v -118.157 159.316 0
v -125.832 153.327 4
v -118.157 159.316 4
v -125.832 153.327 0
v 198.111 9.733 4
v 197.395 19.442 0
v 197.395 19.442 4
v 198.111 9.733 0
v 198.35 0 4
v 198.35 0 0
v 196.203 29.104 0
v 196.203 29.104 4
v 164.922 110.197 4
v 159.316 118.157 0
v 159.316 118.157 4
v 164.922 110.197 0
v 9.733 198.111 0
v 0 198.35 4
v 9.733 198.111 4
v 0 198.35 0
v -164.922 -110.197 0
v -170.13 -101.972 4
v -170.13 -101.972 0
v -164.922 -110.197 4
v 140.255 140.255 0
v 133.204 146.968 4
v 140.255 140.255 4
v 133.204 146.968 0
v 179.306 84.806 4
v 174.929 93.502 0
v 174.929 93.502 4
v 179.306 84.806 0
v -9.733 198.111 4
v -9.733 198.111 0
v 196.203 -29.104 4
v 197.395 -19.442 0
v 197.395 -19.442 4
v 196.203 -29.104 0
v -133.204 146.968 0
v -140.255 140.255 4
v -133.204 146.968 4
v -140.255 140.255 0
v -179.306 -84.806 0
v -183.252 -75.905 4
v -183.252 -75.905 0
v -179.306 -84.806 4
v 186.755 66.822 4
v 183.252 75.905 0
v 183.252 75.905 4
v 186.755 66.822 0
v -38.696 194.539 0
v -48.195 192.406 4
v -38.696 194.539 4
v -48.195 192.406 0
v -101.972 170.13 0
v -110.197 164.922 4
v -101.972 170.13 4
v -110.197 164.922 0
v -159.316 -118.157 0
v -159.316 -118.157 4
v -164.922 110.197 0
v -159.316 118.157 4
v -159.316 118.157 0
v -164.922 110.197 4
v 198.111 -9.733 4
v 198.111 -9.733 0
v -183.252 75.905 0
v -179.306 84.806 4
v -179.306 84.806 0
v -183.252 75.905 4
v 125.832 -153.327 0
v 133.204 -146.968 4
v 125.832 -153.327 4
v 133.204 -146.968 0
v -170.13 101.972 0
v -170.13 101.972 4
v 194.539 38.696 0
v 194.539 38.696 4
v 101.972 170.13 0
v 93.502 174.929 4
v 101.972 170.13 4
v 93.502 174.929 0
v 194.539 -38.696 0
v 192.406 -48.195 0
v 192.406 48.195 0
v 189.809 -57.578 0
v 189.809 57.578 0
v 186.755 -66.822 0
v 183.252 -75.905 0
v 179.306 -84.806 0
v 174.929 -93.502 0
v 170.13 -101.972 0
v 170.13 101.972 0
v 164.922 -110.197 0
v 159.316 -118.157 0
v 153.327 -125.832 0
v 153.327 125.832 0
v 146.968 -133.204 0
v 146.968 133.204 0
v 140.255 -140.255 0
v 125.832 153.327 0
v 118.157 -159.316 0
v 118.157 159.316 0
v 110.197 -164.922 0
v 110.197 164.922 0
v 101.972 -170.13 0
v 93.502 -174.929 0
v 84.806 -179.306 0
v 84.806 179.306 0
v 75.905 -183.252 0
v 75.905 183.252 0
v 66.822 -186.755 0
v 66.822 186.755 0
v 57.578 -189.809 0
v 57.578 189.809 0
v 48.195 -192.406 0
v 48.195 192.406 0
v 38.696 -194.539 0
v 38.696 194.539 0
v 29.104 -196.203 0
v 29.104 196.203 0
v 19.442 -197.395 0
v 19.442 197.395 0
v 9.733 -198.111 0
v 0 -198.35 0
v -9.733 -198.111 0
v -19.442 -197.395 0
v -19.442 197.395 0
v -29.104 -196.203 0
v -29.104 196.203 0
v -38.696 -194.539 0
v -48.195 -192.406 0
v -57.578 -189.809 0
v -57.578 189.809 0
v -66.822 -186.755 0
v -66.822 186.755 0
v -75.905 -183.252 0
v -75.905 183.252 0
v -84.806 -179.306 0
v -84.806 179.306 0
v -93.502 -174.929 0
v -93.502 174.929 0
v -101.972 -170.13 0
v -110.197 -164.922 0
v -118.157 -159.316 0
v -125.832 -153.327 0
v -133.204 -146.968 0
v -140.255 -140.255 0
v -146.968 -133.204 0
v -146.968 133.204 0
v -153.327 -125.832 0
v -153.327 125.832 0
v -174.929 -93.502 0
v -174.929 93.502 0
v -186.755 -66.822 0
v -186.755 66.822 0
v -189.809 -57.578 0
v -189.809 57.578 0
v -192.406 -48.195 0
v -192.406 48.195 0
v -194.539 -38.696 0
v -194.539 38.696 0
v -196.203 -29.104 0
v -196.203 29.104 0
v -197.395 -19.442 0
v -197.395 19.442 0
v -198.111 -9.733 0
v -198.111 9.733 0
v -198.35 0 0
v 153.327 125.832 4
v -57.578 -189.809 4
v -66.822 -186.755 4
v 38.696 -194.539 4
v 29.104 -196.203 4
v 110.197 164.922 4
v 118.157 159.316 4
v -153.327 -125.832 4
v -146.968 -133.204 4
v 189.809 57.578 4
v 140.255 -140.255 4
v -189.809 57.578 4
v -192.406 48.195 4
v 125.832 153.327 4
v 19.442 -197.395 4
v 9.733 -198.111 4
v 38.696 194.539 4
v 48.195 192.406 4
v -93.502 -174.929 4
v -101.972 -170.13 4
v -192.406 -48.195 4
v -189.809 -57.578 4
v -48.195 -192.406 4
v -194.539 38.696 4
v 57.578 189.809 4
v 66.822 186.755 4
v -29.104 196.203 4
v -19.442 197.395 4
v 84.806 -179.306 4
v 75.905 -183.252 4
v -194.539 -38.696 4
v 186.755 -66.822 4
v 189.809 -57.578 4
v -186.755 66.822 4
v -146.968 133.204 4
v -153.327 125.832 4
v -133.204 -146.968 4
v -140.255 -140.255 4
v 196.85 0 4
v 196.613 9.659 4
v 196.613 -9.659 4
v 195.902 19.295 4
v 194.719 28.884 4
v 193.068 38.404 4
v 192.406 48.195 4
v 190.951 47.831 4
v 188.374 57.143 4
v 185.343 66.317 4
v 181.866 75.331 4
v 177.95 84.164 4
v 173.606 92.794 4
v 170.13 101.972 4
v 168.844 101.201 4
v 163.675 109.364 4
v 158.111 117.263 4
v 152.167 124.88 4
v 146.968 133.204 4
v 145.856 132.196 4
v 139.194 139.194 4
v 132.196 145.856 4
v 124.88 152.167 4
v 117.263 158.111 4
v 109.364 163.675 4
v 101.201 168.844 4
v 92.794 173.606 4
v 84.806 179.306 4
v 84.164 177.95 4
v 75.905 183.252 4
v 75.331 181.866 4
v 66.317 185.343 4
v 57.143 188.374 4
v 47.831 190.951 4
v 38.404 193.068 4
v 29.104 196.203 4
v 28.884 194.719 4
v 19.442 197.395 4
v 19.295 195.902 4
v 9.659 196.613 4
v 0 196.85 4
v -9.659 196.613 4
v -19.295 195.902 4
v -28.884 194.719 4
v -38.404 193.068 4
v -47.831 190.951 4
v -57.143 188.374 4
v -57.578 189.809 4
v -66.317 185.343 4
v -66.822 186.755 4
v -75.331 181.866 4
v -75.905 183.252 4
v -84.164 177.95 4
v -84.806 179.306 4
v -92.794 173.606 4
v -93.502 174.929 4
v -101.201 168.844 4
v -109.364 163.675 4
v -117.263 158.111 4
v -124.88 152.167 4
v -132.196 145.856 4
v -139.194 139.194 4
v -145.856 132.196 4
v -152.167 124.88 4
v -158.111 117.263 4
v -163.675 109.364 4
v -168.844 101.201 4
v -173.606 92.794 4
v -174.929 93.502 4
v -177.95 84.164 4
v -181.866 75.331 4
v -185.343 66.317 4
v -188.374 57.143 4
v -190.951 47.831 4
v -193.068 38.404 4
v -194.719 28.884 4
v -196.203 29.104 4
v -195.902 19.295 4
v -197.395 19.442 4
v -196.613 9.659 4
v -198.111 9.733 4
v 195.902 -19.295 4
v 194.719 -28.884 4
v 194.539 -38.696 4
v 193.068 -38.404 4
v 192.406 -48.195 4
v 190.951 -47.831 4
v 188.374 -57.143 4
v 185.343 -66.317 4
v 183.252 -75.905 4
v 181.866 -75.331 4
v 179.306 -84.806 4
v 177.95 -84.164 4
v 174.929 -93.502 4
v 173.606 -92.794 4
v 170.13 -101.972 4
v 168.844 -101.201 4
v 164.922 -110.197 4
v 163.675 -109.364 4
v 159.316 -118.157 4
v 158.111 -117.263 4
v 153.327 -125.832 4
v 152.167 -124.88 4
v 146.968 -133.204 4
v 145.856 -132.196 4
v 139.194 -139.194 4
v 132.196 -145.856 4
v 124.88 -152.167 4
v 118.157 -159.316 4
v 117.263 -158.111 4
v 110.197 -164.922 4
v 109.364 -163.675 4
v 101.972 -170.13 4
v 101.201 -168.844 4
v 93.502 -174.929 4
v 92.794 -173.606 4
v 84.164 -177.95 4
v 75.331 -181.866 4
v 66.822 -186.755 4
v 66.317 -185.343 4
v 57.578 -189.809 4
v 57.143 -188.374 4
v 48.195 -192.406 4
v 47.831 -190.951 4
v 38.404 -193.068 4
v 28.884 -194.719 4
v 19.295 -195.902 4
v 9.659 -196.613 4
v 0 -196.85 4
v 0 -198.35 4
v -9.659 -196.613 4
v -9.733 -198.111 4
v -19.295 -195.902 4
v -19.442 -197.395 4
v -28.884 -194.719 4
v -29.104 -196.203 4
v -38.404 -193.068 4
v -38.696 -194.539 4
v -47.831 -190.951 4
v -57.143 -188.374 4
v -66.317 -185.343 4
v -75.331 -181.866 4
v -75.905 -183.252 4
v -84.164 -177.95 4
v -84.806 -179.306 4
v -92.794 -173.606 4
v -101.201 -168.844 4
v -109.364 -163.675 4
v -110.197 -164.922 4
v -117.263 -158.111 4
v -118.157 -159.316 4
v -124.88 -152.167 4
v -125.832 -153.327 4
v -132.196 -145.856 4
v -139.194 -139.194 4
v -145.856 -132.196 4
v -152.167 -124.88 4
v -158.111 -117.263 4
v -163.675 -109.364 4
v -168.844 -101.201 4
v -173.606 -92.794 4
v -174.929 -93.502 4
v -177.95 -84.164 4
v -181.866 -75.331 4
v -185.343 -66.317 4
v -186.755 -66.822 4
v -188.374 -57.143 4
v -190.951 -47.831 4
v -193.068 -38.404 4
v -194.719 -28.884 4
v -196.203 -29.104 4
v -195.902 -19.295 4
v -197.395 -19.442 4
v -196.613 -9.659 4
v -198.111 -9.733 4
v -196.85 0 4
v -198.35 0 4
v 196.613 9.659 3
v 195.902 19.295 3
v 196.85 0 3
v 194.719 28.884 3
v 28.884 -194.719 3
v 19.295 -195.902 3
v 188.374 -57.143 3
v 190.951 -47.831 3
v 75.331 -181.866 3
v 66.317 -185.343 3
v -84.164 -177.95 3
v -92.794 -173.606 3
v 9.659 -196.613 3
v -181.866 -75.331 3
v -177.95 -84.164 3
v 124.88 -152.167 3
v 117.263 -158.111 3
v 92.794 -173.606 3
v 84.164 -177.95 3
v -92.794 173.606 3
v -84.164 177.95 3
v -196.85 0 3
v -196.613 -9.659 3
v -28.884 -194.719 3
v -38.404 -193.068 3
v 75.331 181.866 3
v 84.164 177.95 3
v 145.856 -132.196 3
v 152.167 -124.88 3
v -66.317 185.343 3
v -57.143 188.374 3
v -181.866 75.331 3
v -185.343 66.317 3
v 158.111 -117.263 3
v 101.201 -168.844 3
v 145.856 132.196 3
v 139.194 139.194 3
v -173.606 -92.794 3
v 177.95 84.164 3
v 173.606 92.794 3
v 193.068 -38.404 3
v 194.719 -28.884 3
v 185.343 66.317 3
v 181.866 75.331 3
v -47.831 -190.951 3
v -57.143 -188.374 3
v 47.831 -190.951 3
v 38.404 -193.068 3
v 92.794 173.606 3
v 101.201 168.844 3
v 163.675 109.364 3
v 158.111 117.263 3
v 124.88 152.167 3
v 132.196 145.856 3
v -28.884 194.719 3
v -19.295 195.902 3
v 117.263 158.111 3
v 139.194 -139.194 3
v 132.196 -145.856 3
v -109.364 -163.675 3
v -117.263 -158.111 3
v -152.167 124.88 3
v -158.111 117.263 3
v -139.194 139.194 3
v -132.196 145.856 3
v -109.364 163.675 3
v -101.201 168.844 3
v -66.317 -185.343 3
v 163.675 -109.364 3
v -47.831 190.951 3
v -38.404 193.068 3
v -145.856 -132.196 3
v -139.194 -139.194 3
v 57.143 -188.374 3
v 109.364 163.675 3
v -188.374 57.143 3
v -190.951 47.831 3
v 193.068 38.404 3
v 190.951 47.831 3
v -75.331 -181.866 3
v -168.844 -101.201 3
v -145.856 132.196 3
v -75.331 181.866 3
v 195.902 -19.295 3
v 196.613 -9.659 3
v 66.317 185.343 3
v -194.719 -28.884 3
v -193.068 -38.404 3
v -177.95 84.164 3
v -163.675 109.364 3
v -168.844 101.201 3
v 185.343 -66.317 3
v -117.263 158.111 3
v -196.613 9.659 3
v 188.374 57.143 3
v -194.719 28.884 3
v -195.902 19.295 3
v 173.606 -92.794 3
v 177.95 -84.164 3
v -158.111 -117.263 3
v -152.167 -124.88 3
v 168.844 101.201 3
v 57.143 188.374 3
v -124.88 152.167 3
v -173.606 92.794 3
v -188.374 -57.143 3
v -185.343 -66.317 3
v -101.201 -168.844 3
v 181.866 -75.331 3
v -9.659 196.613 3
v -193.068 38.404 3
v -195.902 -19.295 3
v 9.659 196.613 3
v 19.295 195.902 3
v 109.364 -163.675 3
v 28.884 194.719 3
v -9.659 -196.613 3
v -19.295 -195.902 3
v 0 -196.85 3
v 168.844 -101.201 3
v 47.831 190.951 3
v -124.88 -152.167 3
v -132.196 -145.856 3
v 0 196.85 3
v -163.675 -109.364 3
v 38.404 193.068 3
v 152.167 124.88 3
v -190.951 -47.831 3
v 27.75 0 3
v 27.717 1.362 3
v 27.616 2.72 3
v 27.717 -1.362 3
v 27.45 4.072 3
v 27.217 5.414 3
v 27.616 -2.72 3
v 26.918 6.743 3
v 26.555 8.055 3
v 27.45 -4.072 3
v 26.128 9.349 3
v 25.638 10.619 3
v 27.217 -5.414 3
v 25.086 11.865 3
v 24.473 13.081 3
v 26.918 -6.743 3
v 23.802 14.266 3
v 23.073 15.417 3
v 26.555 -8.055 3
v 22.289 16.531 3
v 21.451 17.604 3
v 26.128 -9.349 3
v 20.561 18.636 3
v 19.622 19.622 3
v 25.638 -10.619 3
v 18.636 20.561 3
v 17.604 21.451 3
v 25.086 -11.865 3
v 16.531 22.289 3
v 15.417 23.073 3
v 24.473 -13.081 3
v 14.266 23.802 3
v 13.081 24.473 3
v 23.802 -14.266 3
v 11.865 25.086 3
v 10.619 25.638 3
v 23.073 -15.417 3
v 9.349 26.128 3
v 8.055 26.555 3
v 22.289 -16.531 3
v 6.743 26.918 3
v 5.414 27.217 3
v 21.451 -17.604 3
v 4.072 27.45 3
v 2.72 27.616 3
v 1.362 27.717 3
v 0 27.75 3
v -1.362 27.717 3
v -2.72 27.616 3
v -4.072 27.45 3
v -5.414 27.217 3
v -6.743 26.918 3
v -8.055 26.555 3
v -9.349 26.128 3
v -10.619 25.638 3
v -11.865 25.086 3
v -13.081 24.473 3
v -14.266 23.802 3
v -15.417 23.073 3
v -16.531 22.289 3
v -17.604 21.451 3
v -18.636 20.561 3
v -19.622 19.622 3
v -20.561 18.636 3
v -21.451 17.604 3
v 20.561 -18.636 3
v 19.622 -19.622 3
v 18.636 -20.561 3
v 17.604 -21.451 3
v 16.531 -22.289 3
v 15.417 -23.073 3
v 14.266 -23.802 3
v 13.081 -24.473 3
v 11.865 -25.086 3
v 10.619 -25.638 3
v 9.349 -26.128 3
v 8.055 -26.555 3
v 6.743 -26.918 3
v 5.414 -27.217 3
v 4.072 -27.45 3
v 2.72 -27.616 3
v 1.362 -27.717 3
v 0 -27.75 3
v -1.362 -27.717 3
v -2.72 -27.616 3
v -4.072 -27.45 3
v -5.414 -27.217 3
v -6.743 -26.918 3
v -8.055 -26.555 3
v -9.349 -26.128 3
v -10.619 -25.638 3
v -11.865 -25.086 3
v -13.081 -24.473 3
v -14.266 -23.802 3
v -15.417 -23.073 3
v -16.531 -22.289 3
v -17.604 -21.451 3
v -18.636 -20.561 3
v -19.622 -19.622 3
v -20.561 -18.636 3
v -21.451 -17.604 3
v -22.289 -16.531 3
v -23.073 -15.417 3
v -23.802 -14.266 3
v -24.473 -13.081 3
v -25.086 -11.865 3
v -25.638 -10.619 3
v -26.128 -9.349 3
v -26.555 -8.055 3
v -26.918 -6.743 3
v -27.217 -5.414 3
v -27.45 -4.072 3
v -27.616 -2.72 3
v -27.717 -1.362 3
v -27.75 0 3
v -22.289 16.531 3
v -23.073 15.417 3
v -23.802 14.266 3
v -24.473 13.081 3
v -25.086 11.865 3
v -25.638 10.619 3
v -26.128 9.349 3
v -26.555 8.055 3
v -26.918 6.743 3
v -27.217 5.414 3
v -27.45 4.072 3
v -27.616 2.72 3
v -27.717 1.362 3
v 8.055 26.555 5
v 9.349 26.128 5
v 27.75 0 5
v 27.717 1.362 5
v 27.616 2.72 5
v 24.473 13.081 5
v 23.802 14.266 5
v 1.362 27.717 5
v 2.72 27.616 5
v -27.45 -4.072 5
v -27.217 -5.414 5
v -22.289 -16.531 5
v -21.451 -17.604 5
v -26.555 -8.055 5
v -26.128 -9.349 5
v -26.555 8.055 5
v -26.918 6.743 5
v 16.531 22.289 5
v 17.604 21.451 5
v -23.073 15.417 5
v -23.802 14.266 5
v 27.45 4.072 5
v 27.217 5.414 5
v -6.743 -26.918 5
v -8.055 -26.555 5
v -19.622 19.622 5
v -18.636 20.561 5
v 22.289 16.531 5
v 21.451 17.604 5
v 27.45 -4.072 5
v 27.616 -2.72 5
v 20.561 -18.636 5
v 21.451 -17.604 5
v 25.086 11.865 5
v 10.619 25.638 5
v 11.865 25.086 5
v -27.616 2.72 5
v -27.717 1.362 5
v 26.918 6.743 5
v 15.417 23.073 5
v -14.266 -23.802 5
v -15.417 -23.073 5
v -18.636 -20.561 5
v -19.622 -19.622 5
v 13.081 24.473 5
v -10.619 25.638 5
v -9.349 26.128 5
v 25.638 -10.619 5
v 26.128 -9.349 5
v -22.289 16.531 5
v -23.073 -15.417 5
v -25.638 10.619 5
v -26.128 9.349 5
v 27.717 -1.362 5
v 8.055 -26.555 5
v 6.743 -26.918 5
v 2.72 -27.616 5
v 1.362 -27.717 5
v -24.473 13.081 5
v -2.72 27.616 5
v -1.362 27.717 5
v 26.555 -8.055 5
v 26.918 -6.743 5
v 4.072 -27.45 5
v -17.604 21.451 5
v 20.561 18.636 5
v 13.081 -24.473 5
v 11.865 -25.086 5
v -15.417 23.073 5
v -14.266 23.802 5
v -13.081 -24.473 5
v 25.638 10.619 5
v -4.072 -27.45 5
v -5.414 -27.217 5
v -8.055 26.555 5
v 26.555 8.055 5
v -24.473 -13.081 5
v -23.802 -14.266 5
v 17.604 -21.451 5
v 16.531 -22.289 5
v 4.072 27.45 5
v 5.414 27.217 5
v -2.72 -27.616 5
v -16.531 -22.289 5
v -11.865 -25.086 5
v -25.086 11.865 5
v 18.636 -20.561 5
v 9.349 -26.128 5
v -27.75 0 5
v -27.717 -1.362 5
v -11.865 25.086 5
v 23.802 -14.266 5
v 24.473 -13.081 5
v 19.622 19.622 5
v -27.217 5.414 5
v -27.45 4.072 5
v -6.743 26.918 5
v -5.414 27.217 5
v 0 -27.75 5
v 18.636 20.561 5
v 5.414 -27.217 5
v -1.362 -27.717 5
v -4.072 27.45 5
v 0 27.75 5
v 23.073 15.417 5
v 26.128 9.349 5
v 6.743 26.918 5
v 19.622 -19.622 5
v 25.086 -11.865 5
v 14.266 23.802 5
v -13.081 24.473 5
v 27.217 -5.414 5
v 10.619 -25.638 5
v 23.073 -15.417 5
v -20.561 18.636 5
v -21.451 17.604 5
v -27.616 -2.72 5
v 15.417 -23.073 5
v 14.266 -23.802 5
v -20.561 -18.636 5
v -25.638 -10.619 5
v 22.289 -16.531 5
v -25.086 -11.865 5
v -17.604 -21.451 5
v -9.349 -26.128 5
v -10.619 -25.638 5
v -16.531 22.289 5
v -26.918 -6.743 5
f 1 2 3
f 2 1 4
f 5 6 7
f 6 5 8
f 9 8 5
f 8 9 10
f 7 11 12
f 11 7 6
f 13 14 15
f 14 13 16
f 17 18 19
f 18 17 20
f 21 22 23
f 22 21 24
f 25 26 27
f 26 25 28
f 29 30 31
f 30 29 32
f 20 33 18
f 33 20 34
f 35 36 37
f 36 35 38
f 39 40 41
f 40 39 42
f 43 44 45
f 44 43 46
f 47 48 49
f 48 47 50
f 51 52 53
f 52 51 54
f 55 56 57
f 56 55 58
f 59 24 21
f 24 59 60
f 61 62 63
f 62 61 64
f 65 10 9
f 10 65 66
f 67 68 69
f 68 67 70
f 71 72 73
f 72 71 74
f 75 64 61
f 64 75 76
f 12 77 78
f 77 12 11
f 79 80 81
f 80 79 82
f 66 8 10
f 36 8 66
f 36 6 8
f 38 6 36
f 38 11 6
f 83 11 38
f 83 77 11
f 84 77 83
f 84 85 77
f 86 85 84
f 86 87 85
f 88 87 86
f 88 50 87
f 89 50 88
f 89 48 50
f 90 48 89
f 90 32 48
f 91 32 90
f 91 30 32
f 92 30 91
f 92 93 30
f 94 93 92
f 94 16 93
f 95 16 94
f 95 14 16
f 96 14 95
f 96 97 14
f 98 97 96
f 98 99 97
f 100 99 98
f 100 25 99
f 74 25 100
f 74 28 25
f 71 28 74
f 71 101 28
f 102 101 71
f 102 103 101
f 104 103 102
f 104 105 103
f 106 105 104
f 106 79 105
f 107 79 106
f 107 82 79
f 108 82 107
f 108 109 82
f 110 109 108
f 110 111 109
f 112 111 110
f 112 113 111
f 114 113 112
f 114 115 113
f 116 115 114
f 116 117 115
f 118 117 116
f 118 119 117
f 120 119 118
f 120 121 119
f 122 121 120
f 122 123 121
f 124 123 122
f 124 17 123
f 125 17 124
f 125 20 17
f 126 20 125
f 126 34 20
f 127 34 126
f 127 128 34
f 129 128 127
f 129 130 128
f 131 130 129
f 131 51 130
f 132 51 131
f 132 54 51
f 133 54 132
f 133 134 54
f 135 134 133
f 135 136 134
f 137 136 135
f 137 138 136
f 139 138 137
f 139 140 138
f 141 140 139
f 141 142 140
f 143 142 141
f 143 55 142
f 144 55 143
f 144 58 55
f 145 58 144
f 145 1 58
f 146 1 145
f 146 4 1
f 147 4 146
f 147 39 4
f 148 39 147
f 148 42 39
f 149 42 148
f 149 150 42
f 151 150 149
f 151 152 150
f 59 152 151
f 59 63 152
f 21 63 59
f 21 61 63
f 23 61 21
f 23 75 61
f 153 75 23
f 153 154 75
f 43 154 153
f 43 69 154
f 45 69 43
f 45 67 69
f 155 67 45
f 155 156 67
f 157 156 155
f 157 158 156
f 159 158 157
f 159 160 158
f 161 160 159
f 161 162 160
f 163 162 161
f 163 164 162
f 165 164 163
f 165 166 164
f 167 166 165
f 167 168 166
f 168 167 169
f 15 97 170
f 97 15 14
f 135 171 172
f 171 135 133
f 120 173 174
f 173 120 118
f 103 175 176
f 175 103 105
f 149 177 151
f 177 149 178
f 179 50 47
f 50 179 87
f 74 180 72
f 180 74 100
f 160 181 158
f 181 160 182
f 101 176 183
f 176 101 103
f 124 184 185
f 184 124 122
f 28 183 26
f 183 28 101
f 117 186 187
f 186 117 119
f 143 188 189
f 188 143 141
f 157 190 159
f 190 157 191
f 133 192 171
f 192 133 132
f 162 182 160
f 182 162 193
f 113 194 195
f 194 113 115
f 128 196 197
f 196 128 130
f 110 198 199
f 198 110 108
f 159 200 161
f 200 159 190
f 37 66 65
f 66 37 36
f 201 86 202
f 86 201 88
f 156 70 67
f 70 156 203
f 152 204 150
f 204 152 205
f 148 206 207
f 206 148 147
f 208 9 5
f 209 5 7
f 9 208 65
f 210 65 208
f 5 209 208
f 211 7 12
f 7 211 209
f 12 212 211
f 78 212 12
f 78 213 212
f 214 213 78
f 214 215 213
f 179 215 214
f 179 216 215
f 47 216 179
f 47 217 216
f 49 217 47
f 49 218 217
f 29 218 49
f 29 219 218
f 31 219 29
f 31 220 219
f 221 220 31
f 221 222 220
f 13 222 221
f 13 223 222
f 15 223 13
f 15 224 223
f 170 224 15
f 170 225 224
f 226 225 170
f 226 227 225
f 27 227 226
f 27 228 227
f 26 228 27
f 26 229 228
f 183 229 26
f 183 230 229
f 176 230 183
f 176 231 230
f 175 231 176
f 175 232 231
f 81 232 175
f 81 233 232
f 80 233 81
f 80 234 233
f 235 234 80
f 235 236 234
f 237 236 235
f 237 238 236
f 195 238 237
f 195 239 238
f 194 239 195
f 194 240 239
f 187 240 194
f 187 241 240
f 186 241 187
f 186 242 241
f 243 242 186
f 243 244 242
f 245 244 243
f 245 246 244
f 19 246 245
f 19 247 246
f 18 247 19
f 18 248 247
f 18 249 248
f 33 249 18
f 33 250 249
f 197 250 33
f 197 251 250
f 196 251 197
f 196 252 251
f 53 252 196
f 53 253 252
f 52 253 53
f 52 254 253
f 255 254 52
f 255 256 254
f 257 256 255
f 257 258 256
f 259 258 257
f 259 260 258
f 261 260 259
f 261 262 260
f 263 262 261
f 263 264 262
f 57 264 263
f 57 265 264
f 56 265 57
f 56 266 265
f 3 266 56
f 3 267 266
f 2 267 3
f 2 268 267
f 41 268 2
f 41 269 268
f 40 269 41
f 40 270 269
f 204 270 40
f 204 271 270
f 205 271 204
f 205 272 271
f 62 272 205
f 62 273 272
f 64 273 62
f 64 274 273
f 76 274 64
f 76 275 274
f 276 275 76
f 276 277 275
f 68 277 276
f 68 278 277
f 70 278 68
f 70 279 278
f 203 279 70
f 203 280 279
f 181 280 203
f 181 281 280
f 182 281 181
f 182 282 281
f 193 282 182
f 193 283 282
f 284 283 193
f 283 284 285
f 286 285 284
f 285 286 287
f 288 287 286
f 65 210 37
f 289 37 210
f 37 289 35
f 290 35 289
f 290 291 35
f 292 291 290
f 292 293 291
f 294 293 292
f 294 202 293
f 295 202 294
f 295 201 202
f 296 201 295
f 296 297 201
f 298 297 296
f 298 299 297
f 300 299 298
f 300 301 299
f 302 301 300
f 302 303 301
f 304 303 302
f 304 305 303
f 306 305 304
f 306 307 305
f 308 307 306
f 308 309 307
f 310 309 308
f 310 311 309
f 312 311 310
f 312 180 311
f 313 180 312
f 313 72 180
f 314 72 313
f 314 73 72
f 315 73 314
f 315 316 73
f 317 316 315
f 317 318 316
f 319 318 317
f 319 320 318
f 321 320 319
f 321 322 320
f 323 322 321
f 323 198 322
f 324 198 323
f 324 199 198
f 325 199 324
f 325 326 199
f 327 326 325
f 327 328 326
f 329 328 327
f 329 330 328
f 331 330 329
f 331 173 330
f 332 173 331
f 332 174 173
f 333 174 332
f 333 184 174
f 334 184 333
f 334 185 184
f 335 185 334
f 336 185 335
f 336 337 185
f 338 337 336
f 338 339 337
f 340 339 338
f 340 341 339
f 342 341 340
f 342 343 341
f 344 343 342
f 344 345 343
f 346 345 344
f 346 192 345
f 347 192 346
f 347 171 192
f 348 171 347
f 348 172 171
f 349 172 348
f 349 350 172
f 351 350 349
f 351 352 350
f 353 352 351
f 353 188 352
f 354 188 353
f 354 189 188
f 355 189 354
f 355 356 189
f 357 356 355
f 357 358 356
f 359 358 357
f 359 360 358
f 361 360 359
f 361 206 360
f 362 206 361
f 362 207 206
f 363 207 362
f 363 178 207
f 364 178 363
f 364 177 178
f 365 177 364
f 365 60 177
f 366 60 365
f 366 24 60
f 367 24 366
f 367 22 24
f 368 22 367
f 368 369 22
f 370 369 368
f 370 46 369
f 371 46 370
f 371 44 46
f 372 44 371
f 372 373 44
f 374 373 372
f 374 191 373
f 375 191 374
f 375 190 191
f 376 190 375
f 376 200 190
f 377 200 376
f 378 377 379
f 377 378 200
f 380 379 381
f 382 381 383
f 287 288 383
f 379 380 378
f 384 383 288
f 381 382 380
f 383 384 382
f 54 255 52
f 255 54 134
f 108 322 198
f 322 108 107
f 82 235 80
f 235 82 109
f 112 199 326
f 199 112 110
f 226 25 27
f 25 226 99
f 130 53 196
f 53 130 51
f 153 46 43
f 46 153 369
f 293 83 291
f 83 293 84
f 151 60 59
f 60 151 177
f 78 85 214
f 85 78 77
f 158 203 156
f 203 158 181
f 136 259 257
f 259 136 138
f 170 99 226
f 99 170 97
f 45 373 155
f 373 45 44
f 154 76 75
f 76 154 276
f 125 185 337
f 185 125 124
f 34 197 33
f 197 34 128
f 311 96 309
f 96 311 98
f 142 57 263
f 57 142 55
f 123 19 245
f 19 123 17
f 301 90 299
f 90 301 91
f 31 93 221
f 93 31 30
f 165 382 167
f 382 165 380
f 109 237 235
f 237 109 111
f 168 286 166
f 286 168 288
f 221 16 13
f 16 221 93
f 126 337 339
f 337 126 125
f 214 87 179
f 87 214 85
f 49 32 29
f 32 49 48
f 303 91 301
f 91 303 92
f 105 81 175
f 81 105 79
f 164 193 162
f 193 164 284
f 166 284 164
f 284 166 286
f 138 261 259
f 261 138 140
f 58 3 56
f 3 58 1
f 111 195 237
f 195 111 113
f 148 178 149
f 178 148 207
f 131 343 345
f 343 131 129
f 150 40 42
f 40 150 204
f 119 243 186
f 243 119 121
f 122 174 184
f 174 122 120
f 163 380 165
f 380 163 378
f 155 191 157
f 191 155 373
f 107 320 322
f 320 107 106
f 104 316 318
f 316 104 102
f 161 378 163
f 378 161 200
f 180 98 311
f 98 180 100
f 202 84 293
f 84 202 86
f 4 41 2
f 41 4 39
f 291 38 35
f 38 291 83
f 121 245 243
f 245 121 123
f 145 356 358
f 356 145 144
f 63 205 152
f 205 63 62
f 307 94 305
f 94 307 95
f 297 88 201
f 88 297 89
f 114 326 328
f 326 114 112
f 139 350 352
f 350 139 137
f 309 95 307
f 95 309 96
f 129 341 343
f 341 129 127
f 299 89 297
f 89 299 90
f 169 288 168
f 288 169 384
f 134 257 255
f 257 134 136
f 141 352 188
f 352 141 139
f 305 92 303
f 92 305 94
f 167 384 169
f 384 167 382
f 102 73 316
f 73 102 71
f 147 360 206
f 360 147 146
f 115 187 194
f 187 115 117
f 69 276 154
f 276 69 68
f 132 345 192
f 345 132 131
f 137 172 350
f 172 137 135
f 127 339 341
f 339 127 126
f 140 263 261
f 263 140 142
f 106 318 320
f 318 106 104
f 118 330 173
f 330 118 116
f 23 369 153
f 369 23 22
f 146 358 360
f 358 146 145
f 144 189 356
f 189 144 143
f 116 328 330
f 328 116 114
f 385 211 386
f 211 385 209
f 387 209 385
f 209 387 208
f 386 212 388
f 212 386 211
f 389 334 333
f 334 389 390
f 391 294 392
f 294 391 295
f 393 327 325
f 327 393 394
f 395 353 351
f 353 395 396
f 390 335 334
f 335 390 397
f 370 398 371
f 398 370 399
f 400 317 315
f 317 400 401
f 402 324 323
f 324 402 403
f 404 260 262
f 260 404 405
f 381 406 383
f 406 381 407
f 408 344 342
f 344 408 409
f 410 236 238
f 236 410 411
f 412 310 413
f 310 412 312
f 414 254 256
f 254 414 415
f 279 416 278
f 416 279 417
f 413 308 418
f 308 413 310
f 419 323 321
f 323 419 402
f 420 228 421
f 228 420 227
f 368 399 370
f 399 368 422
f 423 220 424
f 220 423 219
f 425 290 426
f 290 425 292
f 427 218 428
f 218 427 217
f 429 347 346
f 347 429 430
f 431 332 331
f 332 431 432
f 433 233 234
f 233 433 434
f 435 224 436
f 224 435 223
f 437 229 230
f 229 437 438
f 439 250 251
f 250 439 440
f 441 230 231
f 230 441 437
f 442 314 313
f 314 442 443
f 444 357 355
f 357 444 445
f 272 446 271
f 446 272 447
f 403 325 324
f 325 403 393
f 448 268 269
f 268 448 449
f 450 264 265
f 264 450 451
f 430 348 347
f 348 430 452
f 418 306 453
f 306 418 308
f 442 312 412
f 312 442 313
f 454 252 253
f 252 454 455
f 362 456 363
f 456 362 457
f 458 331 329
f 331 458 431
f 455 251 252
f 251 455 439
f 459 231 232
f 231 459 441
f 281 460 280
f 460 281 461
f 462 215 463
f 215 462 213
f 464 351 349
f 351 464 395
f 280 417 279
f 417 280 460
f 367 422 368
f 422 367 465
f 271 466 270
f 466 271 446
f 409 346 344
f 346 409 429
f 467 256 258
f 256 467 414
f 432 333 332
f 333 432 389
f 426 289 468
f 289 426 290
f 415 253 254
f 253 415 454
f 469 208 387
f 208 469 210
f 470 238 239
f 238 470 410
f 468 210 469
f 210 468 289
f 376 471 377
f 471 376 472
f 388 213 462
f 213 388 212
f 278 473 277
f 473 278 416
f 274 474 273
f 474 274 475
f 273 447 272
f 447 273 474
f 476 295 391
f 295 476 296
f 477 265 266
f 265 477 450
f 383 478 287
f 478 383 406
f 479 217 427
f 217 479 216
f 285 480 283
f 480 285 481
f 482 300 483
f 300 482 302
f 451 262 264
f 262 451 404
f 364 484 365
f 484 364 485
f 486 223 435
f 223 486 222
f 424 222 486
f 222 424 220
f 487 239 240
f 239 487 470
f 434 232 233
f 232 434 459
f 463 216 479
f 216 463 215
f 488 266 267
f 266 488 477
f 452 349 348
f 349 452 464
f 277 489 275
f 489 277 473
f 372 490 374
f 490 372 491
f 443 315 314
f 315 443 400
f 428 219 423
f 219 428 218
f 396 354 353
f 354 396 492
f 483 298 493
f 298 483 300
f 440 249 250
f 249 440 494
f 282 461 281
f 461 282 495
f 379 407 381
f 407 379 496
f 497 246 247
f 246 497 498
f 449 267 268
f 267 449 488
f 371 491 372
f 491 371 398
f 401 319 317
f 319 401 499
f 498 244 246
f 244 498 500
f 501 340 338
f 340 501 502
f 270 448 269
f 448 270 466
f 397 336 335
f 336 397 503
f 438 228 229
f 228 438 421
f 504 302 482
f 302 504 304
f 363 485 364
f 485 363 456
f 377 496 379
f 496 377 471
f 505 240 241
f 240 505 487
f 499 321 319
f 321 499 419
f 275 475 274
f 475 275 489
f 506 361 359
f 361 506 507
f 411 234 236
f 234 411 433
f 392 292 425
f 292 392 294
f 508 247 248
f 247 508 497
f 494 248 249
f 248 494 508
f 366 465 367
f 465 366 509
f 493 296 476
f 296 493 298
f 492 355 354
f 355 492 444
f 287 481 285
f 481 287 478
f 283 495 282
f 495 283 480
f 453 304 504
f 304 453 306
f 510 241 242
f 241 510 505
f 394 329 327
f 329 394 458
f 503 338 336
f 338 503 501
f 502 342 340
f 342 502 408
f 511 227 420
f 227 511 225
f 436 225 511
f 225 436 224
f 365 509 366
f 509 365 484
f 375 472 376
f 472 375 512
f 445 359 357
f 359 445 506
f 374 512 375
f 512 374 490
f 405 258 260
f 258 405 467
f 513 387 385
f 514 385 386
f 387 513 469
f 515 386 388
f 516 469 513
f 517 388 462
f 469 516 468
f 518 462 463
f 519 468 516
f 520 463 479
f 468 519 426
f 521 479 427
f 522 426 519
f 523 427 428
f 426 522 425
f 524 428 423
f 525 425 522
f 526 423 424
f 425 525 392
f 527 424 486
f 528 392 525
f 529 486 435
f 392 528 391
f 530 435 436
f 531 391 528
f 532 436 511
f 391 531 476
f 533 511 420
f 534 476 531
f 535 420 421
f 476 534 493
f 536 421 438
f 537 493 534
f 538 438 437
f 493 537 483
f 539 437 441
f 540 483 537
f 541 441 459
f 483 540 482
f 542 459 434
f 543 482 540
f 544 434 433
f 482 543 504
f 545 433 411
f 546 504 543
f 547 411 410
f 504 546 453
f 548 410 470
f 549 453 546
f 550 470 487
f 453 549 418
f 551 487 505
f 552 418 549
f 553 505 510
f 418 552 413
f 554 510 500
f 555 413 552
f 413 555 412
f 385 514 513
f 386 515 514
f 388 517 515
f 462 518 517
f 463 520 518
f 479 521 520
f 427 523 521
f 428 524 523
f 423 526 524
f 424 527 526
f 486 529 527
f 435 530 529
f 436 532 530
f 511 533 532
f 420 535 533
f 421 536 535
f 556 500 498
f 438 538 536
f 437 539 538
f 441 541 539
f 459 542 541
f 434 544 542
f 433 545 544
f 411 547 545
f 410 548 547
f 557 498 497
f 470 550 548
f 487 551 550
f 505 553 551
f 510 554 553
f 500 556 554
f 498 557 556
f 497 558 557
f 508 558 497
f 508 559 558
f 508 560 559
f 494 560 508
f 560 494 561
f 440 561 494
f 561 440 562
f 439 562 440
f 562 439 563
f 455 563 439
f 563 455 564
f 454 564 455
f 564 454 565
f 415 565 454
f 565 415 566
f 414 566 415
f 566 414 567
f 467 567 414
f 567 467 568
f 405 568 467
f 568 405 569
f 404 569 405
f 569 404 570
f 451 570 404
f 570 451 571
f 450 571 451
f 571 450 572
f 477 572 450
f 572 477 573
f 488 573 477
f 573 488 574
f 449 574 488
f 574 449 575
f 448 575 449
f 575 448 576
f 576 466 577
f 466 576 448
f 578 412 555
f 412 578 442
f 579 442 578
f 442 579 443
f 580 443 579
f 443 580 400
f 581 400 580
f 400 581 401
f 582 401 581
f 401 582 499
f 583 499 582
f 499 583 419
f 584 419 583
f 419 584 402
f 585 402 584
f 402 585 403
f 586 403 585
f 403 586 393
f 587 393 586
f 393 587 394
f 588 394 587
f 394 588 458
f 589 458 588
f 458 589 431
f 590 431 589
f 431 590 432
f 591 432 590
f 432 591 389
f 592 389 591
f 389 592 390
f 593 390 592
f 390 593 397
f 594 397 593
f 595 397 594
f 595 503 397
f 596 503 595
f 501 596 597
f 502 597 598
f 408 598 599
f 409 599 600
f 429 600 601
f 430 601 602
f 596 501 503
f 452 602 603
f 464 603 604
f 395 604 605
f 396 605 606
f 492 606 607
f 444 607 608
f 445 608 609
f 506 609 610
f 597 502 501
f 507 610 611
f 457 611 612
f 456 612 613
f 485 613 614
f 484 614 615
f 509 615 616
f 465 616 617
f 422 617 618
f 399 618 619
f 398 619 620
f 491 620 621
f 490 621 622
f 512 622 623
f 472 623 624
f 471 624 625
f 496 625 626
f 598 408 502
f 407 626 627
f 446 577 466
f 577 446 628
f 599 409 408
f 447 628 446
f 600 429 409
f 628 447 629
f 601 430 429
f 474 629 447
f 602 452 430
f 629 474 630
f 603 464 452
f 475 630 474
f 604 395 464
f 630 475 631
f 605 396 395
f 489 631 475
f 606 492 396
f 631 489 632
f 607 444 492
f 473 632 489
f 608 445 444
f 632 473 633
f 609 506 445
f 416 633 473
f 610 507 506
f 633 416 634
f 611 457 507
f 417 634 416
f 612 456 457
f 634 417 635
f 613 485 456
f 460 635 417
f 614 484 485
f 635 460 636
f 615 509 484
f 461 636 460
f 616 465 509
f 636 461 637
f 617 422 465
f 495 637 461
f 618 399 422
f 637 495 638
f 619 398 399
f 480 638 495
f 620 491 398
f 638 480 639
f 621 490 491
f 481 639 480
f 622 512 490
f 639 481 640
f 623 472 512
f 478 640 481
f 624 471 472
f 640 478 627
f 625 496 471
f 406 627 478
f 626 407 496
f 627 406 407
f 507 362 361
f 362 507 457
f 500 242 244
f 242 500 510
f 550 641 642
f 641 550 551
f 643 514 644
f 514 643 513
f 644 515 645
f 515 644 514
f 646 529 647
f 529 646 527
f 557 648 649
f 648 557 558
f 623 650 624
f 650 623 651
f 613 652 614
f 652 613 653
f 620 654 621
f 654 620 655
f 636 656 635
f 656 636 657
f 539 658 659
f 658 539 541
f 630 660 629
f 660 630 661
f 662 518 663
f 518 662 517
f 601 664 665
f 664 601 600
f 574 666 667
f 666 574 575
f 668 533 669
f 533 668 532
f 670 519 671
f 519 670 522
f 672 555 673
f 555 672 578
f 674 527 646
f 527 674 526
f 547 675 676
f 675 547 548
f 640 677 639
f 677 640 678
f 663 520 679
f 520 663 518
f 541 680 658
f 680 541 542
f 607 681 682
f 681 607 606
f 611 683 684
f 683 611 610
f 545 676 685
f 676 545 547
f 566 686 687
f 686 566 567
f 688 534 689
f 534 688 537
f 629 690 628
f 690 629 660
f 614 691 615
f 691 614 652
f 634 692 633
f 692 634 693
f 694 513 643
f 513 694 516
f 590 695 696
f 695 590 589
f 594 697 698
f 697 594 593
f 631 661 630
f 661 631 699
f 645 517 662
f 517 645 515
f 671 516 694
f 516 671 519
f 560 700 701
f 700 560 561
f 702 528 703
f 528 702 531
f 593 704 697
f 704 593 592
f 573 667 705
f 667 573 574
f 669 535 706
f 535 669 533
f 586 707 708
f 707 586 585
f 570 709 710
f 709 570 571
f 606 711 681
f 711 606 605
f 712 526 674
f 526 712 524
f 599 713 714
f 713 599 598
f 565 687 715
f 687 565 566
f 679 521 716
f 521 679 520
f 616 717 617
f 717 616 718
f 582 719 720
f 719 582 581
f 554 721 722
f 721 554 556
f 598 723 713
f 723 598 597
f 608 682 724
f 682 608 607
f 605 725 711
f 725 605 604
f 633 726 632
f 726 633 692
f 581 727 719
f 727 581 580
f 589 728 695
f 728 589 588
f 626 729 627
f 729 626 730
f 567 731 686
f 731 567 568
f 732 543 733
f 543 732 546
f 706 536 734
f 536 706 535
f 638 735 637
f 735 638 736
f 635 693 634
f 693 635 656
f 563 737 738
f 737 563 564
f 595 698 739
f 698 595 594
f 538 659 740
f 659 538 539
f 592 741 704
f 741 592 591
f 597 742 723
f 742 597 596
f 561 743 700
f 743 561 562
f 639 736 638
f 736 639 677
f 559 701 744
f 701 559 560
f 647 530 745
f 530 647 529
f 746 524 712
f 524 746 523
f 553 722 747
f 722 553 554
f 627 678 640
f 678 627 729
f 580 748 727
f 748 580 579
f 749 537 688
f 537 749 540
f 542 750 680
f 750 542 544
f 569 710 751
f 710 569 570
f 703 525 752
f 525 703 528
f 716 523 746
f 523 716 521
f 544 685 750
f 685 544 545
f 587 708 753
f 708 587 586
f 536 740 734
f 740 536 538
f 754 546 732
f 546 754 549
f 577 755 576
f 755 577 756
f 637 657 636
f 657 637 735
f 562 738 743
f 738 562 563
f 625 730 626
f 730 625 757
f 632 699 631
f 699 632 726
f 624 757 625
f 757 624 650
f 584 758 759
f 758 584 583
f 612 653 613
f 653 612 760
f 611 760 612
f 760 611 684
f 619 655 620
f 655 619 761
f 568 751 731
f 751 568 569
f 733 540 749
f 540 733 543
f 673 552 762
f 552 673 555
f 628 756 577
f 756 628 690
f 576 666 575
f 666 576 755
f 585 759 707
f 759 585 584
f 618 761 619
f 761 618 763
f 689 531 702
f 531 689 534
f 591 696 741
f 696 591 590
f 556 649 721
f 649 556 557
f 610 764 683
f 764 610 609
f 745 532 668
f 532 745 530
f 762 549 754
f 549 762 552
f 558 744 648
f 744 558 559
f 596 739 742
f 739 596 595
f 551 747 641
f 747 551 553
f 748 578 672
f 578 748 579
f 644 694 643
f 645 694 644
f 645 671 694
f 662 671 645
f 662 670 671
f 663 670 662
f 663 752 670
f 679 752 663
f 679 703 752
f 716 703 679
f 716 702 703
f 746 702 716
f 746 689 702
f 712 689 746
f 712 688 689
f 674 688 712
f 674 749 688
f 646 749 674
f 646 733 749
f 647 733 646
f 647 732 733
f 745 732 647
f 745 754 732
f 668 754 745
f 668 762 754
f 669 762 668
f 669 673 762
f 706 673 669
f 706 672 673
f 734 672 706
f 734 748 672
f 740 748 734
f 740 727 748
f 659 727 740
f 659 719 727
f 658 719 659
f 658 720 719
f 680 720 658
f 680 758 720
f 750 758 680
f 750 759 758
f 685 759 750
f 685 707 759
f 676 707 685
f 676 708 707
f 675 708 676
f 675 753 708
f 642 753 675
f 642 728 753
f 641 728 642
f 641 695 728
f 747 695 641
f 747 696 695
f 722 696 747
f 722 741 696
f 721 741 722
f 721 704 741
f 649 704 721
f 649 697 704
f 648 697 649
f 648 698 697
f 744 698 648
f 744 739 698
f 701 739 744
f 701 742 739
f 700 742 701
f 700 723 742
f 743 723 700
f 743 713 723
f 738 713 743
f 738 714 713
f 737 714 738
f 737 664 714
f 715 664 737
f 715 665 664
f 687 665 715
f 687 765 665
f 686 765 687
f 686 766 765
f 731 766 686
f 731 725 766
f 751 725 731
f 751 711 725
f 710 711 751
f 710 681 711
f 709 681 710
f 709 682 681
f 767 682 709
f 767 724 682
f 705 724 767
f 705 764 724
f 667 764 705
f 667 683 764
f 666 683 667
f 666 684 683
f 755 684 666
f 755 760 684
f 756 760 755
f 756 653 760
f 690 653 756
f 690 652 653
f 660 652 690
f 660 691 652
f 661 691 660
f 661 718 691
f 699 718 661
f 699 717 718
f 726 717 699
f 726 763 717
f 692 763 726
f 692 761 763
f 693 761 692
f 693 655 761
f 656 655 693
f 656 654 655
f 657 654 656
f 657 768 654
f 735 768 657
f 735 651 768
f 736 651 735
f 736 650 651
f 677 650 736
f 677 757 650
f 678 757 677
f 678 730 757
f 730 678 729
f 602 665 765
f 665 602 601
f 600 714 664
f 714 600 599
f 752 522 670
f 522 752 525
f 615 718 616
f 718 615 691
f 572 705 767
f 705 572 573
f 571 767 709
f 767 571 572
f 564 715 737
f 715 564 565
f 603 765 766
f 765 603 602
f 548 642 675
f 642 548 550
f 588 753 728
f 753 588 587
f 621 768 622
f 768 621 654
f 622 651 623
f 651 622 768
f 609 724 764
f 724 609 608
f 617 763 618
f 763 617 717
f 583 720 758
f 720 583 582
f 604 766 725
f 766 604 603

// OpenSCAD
inch = 25.4;

spool_r = 7.75 * inch;
spool_hole_r = (55.5 / 2);

adaptor_inset = 1;
adaptor_hole_inset = 5;

outter_ring_h = 4;
outter_ring_r = spool_r + 1.5;

$fn = 128;

difference() {
    cylinder(h = outter_ring_h, r = outter_ring_r);
    translate([0, 0, (outter_ring_h - adaptor_inset)]) {
        cylinder(h = adaptor_inset, r = spool_r);
    }
}
cylinder(h = adaptor_hole_inset, r = spool_hole_r);
